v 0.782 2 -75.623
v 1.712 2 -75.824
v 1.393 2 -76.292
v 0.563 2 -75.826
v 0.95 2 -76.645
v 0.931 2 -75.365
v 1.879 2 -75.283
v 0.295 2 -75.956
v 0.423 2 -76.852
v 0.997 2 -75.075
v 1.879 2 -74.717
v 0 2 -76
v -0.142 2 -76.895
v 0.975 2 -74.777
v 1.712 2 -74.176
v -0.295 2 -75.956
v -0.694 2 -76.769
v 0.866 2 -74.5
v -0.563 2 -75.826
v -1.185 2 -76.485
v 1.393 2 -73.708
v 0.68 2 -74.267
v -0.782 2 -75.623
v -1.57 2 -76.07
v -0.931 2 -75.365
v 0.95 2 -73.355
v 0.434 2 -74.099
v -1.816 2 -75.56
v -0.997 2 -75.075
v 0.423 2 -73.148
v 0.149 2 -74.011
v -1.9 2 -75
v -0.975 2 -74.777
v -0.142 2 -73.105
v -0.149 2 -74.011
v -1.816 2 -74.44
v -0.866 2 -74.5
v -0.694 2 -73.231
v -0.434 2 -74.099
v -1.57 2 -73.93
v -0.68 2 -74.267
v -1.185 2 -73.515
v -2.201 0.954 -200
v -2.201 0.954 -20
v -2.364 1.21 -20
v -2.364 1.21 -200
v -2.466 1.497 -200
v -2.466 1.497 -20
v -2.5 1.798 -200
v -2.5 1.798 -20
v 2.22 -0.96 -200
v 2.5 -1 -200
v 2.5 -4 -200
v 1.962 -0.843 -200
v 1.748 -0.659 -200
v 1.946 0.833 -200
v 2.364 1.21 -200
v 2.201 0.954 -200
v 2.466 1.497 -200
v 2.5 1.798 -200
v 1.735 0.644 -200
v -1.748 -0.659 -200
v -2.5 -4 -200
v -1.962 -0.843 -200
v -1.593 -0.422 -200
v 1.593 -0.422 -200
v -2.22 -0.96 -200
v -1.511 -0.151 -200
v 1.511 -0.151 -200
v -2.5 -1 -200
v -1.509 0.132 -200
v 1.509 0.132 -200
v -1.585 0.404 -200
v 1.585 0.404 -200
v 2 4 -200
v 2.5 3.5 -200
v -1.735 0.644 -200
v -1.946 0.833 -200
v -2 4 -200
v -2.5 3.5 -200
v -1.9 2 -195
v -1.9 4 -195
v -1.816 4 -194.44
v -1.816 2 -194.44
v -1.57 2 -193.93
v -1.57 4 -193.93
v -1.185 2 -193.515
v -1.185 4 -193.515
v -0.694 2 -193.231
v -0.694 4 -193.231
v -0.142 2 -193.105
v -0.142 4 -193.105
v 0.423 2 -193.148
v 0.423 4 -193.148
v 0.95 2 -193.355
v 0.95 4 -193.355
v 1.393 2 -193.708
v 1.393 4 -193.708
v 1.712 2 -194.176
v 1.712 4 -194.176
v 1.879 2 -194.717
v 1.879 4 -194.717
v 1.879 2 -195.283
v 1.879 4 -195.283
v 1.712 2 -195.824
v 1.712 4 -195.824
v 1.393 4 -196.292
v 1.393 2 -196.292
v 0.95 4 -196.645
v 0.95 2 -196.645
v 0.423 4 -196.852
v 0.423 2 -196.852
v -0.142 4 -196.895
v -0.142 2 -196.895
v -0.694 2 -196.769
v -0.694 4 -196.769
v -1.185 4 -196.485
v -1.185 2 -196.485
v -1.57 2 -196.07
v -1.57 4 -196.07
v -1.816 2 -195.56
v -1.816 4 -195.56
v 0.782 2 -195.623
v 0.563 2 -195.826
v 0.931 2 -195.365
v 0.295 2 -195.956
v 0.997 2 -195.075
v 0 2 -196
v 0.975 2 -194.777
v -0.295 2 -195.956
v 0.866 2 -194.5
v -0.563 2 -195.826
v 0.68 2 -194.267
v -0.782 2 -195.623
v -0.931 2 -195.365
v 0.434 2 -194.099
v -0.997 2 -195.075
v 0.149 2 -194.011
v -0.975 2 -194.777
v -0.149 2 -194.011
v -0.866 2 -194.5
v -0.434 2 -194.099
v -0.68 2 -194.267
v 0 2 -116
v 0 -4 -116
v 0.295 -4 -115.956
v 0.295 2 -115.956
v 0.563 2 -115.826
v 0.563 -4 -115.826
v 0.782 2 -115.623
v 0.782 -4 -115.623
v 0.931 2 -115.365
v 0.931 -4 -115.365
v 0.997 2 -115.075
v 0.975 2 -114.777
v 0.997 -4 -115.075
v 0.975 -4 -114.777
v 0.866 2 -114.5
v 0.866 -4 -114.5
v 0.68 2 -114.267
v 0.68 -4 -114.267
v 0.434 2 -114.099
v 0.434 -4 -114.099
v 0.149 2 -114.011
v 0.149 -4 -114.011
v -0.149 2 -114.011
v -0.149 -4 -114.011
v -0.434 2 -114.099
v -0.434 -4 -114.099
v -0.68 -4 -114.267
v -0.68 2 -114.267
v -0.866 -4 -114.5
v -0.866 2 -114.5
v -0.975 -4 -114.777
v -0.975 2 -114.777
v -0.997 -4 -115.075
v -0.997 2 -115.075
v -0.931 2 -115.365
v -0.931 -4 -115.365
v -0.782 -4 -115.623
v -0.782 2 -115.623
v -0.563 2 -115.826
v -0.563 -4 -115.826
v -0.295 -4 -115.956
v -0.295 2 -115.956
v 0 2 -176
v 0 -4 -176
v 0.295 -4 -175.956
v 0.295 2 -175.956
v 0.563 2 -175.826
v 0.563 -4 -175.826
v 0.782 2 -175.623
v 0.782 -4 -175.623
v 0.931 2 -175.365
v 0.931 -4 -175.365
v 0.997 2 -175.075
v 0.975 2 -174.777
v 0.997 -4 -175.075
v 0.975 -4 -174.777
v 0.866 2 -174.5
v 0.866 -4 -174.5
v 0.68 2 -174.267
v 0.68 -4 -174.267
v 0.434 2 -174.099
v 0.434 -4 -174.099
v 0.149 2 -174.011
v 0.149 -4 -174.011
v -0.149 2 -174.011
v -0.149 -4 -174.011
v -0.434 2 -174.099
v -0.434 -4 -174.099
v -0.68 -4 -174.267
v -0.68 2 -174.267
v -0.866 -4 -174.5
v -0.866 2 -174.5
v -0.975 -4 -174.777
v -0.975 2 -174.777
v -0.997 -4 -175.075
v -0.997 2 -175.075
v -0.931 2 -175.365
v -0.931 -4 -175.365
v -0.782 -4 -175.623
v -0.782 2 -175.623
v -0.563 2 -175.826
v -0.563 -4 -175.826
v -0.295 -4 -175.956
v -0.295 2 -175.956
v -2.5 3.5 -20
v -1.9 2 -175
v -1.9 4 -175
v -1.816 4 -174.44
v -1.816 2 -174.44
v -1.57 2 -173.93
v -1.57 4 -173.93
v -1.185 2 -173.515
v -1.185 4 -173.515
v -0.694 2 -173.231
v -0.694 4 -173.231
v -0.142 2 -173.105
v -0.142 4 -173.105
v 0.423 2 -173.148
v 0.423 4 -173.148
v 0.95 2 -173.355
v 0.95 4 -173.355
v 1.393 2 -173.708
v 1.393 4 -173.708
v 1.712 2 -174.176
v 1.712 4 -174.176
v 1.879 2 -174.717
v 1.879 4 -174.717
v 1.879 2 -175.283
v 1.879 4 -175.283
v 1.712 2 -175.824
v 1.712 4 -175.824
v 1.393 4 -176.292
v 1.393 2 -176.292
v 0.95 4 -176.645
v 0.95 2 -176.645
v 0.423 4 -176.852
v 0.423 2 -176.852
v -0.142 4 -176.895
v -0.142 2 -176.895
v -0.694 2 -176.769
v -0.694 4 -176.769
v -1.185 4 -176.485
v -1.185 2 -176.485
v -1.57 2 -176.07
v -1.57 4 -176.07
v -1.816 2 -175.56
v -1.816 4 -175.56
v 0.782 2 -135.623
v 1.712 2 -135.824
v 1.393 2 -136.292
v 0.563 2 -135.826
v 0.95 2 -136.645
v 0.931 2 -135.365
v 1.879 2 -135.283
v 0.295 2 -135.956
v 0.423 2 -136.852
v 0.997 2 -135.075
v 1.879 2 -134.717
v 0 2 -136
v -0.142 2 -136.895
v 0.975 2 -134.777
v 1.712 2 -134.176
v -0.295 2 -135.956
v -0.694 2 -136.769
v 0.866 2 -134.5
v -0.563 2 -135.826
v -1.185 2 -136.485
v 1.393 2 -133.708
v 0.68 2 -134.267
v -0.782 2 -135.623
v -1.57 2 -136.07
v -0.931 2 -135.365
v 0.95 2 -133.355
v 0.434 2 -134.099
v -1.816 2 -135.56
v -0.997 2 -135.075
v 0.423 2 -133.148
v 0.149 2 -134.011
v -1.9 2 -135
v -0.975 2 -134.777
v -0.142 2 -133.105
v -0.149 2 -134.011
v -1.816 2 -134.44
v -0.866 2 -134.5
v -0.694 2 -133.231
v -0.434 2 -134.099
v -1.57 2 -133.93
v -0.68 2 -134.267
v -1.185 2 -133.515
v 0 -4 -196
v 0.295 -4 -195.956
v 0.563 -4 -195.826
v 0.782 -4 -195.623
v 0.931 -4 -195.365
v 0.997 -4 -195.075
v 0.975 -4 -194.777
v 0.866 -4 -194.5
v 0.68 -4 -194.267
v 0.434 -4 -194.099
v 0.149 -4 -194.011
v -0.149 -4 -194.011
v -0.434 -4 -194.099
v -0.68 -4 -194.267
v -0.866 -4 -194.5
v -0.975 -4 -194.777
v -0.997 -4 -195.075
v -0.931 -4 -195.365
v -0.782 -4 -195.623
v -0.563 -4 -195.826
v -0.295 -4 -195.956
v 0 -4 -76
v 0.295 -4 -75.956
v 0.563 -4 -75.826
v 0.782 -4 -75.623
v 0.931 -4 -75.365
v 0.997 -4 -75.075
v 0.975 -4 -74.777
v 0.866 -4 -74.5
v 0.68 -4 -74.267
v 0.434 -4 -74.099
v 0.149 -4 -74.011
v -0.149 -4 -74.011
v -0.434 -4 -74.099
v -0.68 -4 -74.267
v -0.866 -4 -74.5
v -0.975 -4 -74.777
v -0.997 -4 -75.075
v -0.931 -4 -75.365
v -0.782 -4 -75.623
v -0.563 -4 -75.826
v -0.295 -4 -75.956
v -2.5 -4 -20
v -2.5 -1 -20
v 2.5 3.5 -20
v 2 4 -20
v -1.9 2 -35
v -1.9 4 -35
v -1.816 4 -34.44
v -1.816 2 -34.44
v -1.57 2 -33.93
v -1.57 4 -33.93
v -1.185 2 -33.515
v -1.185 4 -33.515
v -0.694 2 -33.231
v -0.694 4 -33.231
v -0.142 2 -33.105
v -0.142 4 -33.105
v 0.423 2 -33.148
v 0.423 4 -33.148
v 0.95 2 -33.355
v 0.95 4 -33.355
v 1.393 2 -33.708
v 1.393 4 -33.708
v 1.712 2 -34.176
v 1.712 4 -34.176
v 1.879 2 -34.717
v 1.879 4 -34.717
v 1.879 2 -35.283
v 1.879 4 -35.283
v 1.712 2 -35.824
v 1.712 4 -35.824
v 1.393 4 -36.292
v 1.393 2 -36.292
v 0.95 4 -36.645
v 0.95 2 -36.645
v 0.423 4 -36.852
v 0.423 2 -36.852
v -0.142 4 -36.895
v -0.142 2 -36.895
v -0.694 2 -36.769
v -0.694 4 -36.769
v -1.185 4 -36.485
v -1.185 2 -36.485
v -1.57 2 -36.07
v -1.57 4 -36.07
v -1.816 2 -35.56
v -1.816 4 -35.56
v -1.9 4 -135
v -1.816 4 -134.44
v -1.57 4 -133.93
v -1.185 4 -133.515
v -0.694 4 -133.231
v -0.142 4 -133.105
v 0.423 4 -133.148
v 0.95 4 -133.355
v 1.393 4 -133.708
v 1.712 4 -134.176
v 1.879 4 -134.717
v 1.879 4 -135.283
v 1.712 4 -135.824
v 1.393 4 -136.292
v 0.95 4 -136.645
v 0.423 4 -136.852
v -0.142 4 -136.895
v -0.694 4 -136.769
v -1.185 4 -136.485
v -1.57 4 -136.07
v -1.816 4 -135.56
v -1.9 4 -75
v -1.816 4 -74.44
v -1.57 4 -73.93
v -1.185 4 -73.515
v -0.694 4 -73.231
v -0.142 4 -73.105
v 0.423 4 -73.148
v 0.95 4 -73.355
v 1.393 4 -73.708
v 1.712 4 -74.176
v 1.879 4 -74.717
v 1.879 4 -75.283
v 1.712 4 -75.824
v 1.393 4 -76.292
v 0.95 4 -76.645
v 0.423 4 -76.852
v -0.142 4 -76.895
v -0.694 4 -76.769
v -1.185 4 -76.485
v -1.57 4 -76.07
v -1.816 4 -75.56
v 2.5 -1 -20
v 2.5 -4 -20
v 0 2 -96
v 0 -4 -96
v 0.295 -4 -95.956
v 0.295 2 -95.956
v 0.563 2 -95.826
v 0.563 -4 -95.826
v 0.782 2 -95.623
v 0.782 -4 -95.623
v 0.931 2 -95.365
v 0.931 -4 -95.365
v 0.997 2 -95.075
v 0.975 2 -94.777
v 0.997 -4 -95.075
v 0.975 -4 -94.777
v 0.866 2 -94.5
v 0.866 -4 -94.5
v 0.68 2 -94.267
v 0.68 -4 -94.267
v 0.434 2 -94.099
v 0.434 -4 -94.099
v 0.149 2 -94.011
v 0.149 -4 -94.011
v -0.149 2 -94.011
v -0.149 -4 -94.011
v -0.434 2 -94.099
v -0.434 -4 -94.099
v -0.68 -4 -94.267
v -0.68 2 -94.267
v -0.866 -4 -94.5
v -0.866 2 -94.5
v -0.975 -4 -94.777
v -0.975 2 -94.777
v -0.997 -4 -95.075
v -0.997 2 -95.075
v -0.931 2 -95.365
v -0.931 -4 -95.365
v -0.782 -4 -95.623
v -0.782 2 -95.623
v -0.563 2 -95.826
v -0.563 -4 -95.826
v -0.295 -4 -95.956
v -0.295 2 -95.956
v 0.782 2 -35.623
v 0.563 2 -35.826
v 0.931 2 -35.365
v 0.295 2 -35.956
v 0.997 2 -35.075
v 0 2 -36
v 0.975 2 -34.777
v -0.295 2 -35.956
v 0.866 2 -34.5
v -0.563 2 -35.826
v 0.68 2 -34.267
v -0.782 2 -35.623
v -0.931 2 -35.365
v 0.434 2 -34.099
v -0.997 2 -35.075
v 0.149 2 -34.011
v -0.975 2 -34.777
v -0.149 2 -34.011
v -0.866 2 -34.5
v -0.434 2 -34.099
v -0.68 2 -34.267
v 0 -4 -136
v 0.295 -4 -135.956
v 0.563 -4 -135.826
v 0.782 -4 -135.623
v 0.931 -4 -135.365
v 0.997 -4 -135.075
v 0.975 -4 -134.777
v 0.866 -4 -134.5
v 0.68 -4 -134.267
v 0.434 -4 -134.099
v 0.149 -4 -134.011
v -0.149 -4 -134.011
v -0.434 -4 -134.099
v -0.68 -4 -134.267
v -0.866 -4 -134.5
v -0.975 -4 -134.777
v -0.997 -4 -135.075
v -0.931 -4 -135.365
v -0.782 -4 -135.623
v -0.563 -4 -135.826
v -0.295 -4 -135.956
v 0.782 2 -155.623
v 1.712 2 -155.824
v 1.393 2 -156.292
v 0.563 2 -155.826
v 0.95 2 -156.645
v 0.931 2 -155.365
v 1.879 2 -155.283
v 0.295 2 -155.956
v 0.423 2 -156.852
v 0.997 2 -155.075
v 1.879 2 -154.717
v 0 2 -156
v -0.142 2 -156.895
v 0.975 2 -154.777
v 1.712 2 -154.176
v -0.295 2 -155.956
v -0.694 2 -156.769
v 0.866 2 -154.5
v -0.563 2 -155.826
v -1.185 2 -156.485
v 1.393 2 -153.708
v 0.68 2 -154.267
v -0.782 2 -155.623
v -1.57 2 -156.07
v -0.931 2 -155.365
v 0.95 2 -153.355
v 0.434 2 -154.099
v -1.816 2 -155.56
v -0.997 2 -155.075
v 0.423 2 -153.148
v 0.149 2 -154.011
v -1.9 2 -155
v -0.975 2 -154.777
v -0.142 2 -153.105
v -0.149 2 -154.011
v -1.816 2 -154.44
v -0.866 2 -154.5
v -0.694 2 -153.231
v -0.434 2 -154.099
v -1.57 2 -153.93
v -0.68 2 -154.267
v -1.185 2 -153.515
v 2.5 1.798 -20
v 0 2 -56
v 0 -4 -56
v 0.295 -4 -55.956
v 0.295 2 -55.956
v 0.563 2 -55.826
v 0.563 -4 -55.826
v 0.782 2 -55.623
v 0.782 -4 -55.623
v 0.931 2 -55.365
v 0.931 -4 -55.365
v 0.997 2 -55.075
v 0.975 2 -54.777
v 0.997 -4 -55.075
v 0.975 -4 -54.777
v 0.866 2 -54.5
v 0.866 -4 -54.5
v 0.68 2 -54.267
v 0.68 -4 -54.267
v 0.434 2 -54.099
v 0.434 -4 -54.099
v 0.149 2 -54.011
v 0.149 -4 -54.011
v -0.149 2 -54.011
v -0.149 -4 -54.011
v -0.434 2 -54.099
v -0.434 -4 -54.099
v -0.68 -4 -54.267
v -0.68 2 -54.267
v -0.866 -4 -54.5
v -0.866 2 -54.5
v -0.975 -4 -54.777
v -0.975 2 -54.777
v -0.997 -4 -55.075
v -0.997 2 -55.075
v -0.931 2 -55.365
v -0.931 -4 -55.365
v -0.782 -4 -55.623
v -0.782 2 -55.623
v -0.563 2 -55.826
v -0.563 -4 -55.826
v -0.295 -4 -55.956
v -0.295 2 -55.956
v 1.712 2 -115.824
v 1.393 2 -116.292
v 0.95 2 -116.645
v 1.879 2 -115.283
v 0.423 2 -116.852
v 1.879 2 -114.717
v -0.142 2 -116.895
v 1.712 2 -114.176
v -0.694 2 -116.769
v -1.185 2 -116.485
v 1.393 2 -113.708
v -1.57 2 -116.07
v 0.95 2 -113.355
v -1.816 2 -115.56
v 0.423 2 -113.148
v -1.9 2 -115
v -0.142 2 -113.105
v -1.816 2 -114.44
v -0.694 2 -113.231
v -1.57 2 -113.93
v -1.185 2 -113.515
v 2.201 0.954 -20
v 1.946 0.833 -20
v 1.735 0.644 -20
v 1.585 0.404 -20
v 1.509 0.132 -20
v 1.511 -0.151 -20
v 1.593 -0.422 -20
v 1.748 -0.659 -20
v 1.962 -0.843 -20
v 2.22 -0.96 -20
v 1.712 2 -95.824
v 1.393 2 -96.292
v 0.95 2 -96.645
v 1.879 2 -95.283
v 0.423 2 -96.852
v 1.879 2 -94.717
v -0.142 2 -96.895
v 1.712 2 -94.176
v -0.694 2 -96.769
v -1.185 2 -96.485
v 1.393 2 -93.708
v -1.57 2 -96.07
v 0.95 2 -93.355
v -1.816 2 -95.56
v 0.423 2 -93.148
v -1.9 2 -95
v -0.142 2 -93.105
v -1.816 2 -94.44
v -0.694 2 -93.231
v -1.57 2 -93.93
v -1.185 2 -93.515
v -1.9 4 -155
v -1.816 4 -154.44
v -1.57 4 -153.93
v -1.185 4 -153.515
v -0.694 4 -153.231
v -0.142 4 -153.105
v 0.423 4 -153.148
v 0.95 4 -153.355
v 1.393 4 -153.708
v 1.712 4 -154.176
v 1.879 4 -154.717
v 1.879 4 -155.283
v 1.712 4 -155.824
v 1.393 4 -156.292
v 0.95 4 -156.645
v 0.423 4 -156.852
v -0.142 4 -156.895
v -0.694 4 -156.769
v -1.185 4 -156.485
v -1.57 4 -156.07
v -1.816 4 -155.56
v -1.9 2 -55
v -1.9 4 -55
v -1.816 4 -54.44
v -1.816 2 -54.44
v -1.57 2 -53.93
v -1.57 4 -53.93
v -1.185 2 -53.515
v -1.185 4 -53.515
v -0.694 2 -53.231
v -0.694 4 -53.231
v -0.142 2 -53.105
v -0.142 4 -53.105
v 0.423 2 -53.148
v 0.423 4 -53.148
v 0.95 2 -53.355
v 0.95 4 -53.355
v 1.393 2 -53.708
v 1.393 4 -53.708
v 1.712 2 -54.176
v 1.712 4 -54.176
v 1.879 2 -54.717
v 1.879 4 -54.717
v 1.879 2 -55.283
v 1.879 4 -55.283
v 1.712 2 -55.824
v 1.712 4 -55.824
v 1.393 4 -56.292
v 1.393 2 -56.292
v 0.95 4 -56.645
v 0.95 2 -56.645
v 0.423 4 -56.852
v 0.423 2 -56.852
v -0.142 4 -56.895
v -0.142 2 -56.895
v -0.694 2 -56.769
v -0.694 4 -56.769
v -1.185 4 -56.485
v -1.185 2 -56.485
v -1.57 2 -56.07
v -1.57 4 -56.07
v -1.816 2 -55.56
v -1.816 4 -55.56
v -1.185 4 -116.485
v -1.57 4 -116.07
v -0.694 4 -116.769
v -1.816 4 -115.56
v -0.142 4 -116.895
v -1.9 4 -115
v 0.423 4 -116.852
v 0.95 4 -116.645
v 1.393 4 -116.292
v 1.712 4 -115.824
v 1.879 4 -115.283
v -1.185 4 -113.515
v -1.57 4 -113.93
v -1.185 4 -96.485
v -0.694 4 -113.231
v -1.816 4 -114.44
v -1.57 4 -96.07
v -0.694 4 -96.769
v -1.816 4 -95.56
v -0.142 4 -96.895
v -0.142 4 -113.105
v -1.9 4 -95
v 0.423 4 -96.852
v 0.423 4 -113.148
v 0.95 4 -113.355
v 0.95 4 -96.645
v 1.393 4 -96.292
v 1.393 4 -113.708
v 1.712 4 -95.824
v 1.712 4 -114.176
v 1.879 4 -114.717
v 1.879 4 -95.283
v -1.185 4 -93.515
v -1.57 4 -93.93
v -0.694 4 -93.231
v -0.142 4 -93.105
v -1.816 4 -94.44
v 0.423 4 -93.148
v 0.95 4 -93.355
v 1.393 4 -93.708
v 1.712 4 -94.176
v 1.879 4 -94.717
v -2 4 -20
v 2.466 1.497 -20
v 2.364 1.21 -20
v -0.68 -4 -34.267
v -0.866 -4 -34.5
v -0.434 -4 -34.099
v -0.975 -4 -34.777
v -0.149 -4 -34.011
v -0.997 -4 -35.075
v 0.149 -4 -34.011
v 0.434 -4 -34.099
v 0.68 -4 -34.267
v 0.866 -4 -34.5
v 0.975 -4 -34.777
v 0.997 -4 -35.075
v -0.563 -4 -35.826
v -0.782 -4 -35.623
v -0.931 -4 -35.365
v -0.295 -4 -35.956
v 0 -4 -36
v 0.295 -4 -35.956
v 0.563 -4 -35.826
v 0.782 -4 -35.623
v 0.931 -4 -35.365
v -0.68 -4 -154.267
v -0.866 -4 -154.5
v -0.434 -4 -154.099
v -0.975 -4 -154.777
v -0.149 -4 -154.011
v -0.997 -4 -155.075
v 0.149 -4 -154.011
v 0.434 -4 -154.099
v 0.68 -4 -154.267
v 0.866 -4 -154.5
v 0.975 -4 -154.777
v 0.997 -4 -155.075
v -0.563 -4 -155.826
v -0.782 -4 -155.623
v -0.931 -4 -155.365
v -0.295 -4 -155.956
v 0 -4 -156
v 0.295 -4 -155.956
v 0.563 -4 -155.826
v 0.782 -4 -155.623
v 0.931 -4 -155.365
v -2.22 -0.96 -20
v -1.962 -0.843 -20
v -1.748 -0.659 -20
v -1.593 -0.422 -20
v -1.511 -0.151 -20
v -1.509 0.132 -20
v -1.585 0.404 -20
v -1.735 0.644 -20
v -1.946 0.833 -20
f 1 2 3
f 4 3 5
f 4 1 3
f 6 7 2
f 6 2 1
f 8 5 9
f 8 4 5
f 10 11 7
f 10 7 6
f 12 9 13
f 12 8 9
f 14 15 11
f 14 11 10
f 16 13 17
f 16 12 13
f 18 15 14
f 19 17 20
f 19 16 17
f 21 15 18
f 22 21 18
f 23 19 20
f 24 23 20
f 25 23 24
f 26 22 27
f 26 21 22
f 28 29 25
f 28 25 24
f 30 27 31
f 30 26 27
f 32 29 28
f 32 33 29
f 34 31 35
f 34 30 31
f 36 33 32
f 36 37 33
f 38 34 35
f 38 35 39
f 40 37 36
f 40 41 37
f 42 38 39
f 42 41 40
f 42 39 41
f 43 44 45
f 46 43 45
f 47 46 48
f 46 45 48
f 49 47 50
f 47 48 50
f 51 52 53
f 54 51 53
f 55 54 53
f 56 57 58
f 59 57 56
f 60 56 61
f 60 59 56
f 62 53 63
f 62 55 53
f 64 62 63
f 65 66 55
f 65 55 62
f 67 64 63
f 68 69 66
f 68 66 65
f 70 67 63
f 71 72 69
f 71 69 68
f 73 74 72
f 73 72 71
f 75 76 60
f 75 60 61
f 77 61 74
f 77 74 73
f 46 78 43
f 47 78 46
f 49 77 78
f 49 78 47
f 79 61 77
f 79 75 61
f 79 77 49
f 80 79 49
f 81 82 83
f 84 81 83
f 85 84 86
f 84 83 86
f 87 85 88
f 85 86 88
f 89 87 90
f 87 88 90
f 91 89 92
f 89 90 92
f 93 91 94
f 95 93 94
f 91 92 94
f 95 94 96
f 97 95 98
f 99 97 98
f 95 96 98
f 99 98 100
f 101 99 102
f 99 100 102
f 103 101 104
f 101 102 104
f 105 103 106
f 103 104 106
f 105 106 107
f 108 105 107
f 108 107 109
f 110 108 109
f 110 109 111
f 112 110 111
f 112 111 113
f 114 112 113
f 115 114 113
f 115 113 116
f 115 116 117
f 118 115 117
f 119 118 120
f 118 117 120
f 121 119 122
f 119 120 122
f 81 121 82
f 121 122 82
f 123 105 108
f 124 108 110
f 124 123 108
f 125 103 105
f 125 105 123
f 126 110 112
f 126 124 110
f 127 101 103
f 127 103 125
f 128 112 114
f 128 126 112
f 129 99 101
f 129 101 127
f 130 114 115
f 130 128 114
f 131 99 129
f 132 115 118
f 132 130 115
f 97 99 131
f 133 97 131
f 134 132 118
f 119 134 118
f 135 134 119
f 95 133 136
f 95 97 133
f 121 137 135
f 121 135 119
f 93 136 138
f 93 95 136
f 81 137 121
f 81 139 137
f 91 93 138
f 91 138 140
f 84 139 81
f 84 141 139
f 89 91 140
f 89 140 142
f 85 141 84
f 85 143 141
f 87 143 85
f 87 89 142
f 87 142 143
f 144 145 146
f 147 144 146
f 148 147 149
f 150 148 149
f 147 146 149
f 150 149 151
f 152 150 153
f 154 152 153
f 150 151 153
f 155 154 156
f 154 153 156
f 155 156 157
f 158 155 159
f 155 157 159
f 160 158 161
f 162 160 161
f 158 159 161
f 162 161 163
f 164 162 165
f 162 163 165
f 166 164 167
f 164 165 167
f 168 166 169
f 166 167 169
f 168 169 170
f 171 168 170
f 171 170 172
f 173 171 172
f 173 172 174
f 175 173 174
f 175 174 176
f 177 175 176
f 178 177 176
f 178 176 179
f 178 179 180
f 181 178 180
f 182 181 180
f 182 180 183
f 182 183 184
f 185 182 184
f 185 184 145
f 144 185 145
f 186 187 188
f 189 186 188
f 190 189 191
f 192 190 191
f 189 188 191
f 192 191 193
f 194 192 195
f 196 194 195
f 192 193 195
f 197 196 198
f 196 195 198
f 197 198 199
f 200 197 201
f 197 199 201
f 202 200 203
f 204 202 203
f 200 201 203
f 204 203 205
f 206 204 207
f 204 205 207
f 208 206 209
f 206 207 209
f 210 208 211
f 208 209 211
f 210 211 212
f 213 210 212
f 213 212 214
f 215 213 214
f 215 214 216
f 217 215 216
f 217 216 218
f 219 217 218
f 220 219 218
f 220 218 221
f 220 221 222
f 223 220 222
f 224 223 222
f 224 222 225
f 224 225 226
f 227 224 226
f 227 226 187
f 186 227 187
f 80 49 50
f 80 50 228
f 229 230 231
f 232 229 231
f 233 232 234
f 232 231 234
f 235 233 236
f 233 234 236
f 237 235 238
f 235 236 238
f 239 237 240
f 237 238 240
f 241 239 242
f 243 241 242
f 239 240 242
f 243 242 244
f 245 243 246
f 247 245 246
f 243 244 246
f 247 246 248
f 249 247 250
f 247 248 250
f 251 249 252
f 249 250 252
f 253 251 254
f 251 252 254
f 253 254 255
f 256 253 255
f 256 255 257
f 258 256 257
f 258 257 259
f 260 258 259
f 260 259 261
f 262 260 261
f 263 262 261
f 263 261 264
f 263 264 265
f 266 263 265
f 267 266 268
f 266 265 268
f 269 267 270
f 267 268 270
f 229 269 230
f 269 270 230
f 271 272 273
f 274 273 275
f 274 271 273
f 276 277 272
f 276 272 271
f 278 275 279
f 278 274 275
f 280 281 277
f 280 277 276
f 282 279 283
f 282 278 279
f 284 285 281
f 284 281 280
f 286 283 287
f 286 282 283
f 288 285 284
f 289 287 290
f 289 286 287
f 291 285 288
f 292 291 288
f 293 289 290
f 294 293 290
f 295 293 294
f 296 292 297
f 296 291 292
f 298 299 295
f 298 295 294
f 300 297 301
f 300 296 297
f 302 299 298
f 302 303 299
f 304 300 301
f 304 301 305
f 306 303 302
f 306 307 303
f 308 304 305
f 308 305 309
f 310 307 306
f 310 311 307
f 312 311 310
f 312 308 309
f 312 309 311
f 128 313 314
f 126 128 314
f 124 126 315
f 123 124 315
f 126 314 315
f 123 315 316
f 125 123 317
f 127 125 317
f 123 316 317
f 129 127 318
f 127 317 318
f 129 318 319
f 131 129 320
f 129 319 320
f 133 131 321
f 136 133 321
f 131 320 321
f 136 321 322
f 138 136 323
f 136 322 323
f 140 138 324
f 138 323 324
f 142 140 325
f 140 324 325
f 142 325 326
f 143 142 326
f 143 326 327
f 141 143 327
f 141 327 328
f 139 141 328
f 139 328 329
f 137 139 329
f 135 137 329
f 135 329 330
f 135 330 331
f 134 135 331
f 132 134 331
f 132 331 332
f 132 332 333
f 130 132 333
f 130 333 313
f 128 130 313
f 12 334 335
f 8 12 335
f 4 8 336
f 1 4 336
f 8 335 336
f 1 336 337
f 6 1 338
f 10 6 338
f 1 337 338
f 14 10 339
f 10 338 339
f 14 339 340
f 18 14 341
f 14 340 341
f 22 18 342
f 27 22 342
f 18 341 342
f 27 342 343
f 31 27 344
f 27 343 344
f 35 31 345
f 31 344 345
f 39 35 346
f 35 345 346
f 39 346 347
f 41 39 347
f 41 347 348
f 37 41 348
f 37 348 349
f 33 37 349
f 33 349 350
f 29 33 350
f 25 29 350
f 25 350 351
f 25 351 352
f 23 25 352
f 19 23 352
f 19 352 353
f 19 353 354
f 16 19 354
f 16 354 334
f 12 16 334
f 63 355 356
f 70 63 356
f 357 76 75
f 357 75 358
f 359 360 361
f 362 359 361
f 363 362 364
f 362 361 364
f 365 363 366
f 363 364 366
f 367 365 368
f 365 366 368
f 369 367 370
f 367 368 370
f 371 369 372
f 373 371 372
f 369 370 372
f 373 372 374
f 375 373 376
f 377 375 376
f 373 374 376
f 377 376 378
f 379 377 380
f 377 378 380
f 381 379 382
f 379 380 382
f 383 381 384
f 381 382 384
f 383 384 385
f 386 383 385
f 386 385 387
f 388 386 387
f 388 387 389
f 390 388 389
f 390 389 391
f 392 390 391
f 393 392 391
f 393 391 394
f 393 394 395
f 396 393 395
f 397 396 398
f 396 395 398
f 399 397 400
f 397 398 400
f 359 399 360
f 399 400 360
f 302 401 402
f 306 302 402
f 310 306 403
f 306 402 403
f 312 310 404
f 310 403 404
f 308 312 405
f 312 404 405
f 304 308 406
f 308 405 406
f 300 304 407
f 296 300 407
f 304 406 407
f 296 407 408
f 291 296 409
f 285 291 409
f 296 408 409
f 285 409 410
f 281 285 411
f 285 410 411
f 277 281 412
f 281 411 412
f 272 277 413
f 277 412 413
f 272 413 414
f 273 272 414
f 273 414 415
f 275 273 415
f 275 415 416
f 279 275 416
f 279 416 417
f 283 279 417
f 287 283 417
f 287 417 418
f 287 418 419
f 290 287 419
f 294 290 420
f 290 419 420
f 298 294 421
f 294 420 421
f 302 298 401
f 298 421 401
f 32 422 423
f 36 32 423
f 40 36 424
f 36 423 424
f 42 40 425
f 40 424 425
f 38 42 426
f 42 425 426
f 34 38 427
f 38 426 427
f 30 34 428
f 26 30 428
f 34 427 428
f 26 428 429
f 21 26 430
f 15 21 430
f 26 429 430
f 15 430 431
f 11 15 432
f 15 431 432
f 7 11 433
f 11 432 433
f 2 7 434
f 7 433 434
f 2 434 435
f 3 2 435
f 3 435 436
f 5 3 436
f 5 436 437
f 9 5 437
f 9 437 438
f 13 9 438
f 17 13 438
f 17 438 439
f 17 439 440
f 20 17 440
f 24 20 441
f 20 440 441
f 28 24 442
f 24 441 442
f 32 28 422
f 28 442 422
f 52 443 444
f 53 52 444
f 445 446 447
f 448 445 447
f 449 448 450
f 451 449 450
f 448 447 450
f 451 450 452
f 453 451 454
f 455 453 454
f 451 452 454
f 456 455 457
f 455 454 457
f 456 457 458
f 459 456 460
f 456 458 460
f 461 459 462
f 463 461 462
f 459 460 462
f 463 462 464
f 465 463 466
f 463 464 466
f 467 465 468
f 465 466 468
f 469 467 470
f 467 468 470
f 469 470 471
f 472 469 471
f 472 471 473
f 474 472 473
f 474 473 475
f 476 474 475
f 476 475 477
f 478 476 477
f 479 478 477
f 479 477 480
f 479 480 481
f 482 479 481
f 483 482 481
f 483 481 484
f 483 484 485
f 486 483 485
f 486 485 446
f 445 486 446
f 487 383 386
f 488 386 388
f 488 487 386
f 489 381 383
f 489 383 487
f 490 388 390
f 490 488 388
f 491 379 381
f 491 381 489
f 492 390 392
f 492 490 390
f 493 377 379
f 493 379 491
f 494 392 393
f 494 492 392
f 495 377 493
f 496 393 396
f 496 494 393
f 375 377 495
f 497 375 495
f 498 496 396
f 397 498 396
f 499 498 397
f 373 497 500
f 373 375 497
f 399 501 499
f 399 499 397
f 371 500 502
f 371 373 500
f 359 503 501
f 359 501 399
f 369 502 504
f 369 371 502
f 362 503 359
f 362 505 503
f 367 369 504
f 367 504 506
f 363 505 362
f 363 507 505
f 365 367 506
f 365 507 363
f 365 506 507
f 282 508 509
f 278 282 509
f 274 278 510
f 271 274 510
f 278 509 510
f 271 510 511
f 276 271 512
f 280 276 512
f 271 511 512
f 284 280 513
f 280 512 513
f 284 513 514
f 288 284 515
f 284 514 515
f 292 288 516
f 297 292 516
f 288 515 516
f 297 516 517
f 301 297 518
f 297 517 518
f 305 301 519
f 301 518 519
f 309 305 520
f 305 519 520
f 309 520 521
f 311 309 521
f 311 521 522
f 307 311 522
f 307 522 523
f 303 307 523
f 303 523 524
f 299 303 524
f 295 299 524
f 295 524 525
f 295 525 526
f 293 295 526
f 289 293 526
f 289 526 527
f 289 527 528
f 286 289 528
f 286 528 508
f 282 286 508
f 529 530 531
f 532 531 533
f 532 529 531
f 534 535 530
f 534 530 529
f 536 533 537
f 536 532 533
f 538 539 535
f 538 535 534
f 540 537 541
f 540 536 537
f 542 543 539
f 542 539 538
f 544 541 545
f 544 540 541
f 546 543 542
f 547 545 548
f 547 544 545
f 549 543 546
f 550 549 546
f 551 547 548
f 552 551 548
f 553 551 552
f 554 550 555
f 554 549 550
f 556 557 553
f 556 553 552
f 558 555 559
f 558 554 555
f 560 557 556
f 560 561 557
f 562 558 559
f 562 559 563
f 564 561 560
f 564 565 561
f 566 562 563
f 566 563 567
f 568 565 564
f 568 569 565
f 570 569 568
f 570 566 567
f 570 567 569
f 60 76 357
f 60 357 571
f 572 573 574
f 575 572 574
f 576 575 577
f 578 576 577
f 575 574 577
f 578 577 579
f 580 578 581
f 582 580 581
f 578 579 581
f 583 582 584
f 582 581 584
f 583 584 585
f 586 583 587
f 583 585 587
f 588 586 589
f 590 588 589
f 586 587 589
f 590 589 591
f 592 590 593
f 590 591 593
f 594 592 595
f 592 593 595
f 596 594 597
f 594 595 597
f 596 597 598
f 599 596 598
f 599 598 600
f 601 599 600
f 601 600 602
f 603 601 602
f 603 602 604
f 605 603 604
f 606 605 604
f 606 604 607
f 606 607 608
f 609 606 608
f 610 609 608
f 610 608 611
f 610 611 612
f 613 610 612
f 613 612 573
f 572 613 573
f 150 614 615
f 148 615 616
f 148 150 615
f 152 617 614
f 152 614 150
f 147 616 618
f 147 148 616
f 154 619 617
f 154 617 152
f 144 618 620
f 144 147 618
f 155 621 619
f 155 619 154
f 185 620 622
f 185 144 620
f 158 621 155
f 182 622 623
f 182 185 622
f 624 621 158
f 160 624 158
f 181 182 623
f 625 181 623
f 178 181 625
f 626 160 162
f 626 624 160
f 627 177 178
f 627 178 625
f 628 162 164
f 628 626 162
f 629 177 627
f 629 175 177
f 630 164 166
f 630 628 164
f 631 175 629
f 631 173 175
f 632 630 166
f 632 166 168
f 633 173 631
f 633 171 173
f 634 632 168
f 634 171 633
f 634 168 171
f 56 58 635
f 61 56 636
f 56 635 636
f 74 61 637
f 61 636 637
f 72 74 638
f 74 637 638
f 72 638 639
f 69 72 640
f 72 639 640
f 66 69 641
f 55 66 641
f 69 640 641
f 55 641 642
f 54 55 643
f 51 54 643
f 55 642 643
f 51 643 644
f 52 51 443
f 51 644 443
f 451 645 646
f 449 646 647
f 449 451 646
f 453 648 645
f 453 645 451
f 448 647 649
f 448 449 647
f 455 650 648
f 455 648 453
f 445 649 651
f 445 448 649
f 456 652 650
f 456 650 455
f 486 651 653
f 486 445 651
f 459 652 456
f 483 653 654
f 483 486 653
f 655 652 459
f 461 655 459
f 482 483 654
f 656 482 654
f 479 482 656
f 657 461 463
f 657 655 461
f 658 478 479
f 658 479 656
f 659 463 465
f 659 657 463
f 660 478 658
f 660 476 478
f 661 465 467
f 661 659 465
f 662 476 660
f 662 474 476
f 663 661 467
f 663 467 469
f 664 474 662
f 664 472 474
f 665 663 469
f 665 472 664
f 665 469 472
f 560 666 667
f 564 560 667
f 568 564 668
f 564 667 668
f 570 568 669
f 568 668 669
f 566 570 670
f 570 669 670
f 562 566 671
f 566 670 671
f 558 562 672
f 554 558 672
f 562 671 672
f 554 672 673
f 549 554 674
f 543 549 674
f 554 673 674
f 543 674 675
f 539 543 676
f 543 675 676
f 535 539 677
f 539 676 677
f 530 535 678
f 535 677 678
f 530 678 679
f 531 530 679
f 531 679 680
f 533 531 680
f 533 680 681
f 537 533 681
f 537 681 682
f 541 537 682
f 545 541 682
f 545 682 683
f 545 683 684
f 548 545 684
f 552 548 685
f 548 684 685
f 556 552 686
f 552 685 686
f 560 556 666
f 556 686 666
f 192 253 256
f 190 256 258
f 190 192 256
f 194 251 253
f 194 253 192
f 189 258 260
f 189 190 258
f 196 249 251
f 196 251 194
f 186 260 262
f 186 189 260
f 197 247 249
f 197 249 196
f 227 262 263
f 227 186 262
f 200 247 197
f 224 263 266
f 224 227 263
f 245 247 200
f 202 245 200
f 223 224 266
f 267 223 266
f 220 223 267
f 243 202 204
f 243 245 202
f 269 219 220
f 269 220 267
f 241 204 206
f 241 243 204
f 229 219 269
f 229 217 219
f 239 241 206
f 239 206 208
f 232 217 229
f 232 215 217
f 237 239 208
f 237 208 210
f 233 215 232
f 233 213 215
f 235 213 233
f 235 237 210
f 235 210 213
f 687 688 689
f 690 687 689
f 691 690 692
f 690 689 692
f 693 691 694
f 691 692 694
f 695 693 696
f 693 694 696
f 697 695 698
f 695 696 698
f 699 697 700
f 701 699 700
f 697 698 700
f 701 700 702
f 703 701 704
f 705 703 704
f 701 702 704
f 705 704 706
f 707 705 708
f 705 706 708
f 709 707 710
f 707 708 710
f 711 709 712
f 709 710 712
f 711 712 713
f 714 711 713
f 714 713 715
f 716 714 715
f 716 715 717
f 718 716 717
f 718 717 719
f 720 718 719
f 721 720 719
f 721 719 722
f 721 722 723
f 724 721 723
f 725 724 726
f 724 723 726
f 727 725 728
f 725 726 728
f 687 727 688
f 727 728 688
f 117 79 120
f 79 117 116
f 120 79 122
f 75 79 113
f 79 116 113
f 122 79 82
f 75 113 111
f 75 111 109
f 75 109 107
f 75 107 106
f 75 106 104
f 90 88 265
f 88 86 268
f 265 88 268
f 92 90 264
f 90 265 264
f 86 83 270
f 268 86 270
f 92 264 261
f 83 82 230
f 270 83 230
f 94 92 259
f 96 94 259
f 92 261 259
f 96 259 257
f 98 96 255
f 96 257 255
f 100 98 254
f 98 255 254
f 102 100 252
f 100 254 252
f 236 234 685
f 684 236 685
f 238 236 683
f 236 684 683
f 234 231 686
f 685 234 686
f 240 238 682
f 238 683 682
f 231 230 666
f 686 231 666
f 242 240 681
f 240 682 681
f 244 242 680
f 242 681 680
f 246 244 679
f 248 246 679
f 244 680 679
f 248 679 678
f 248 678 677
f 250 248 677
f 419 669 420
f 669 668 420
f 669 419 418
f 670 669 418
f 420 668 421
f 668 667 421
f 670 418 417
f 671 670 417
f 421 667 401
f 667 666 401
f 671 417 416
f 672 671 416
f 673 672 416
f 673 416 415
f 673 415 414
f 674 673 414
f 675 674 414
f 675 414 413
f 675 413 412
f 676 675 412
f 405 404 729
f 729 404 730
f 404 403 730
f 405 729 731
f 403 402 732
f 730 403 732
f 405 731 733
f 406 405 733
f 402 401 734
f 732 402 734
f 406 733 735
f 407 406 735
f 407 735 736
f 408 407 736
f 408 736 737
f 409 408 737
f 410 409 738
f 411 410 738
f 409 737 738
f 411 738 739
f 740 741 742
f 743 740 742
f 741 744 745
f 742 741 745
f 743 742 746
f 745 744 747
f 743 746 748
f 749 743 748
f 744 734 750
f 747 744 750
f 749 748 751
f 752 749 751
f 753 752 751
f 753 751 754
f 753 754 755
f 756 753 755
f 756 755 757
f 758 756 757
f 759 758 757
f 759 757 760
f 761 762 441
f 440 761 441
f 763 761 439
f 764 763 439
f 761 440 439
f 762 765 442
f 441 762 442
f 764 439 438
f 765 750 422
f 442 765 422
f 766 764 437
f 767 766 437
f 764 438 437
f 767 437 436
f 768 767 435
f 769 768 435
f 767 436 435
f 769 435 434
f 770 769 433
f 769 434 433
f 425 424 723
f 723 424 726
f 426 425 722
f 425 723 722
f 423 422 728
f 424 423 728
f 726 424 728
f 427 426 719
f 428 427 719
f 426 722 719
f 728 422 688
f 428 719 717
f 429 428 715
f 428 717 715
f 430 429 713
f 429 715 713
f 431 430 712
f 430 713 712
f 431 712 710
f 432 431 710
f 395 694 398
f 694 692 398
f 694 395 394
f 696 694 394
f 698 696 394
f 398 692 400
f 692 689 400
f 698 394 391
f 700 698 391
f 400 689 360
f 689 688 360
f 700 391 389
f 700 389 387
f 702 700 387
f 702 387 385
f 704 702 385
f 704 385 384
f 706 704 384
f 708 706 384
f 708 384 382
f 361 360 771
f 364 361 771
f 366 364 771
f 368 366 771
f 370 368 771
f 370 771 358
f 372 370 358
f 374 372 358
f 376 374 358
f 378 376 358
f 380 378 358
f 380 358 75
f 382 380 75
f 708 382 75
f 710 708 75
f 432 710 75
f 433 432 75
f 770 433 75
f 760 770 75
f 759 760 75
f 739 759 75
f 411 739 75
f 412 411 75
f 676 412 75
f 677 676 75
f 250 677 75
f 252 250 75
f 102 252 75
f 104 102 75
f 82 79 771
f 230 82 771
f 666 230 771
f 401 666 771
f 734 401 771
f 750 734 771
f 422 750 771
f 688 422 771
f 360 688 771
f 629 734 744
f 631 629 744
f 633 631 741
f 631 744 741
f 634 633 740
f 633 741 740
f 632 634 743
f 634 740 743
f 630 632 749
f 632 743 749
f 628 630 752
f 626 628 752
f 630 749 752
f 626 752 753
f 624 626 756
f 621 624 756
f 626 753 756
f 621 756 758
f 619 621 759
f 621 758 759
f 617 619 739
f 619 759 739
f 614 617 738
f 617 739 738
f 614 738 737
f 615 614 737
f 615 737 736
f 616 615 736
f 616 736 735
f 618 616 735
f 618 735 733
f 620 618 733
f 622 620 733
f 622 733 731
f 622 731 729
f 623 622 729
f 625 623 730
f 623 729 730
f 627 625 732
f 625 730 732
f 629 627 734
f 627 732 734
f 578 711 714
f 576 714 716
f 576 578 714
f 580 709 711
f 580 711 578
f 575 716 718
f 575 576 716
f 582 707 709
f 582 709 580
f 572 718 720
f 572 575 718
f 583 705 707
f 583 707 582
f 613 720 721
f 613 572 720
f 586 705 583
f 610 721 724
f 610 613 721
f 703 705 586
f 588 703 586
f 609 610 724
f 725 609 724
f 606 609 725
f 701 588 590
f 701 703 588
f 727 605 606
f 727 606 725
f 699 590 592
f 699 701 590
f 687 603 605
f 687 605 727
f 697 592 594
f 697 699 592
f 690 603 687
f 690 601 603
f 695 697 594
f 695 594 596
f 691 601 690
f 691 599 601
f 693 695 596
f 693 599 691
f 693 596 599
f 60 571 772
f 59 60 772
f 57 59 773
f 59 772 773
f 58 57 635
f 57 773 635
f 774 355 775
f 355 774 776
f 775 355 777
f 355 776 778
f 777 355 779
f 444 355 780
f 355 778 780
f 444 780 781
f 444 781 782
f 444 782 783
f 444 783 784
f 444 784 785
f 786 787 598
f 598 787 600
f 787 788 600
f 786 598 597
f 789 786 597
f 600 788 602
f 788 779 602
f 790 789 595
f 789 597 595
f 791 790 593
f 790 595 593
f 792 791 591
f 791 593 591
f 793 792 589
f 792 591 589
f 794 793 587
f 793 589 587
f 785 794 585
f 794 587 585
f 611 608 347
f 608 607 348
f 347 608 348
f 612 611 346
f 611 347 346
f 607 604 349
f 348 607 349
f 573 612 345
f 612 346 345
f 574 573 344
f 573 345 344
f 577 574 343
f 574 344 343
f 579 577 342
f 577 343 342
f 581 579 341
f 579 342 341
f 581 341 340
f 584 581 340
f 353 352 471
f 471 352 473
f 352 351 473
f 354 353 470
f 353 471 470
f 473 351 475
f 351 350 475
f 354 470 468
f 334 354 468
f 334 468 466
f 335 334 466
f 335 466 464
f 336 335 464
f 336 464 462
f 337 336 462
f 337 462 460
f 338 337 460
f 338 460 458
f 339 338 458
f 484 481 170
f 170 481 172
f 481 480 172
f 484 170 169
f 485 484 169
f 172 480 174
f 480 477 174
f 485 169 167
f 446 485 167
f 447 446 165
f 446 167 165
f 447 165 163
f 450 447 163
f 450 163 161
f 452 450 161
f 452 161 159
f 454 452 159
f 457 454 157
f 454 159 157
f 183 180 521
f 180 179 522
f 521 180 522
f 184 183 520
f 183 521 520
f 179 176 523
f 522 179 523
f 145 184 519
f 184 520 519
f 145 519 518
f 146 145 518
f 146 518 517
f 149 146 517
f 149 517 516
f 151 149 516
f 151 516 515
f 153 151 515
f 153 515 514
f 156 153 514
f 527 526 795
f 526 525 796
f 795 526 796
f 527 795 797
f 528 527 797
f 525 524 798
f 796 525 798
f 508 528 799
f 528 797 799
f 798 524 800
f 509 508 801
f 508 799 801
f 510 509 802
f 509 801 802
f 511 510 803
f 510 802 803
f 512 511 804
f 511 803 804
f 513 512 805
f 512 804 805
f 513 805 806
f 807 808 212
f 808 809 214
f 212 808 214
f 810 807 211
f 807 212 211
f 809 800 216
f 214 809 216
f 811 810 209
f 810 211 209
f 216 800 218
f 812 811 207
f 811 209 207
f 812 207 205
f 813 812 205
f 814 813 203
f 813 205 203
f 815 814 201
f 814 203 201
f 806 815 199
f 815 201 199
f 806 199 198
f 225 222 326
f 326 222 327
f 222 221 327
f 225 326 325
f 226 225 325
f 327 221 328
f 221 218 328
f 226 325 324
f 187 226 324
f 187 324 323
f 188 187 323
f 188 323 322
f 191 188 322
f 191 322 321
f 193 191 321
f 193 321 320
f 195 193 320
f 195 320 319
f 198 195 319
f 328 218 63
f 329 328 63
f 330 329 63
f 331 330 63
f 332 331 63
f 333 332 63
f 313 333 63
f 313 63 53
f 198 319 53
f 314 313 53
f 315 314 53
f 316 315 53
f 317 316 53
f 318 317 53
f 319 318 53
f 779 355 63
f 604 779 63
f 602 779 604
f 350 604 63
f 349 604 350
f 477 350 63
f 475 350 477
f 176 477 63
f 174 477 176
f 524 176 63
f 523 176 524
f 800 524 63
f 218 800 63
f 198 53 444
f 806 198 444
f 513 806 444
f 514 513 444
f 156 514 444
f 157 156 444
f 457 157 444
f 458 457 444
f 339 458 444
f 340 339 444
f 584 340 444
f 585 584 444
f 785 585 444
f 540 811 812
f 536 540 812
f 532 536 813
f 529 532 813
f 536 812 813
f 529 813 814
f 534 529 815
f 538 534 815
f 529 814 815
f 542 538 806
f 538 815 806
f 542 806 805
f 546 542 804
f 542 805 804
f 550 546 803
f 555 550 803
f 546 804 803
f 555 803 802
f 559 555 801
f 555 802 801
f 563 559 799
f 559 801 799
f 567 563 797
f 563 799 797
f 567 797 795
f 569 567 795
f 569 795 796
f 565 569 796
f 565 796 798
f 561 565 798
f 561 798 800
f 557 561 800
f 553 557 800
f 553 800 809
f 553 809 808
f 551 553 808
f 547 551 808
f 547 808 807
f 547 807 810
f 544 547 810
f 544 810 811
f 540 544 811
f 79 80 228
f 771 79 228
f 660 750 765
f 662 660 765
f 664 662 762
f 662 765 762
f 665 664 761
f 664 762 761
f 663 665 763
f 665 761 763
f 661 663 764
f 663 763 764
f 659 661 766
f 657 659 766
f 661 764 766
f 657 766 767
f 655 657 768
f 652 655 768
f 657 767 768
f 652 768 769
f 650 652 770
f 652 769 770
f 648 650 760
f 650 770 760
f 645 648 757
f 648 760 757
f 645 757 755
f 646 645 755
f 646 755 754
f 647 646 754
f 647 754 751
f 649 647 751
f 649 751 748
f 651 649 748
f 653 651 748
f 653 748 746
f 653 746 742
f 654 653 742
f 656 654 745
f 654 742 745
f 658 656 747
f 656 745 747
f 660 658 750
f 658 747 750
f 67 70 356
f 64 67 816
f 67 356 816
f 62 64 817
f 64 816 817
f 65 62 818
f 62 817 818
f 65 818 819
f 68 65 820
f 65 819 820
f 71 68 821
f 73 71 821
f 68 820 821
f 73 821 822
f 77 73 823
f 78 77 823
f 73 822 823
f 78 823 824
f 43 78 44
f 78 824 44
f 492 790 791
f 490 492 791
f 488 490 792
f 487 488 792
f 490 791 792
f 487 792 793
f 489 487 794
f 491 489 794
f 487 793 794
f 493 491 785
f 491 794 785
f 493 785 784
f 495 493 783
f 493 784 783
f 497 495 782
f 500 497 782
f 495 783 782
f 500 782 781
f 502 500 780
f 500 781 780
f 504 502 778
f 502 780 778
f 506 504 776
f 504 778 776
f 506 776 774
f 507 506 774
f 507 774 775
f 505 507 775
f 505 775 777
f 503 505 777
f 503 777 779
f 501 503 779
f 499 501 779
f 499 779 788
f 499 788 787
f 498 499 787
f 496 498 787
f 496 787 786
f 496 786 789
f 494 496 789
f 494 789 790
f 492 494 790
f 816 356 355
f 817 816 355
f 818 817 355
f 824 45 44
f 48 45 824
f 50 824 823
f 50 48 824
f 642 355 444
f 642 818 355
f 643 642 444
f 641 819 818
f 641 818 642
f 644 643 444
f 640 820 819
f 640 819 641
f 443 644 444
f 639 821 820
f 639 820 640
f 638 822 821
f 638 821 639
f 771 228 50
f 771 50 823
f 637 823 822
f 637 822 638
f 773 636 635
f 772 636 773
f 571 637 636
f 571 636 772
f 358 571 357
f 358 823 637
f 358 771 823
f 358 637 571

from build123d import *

# Parameters (mm, degrees)
SKETCH1_W           = 5
SKETCH1_H           = 8
BOSS_EXTRUDE1_DEPTH = 185
BOSS_EXTRUDE2_DEPTH = 200
SKETCH3_W           = 5
SKETCH3_H           = 8
CUT_EXTRUDE1_DEPTH  = 200
CUT_EXTRUDE2_REACH  = 202.176
SKETCH4_R           = 1
SKETCH5_R           = 1.9
CUT_EXTRUDE3_DEPTH  = 2
CHAMFER1_SIZE       = 0.5
CHAMFER2_SIZE       = 0.5
CUT_EXTRUDE4_DEPTH  = 5


with BuildPart() as part:
    # Sketch1 → Boss-Extrude1 (new body)
    with BuildSketch(Plane.XY):
        Rectangle(SKETCH1_W, SKETCH1_H)
    extrude(amount=BOSS_EXTRUDE1_DEPTH)

    # Sketch2 → Boss-Extrude2 (add)
    with BuildSketch(Plane(origin=(0, 0, 0), x_dir=(-1, 0, 0), z_dir=(0, 0, -1))):
        with BuildLine():
            Line((-2.5, 4), (-2.5, 1.798202453))
            ThreePointArc((-2.5, 1.798202453), (-2.423157727, 1.350663613), (-2.2014329, 0.954388646))
            ThreePointArc((-2.2014329, 0.954388646), (-1.511468603, -0.151015487), (-2.5, -1))
            Line((-2.5, -1), (-2.5, -4))
            Line((-2.5, -4), (2.5, -4))
            Line((2.5, -4), (2.5, -1))
            ThreePointArc((2.5, -1), (1.511468603, -0.151015487), (2.2014329, 0.954388646))
            ThreePointArc((2.2014329, 0.954388646), (2.423157727, 1.350663613), (2.5, 1.798202453))
            Line((2.5, 1.798202453), (2.5, 4))
            Line((2.5, 4), (-2.5, 4))
        make_face()
    extrude(amount=BOSS_EXTRUDE2_DEPTH)

    # Sketch3 → Cut-Extrude1 (cut)
    with BuildSketch(Plane.XY.offset(185)):
        Rectangle(SKETCH3_W, SKETCH3_H)
    extrude(amount=-CUT_EXTRUDE1_DEPTH, mode=Mode.SUBTRACT)

    # Sketch4 → Cut-Extrude2 (cut, up to next)
    with BuildSketch(Plane.XZ.offset(4), mode=Mode.PRIVATE) as cut_extrude2_sk1:
        with Locations(Location((0, -35, 0), (0, 0, 270))):
            Circle(SKETCH4_R)
    cut_extrude2_tool1 = extrude(cut_extrude2_sk1.sketch, amount=-CUT_EXTRUDE2_REACH, mode=Mode.PRIVATE) & part.part
    # Sketch4 → Cut-Extrude2 (cut, up to next)
    with BuildSketch(Plane.XZ.offset(4), mode=Mode.PRIVATE) as cut_extrude2_sk2:
        with Locations(Location((0, -55, 0), (0, 0, 270))):
            Circle(SKETCH4_R)
    cut_extrude2_tool2 = extrude(cut_extrude2_sk2.sketch, amount=-CUT_EXTRUDE2_REACH, mode=Mode.PRIVATE) & part.part
    # Sketch4 → Cut-Extrude2 (cut, up to next)
    with BuildSketch(Plane.XZ.offset(4), mode=Mode.PRIVATE) as cut_extrude2_sk3:
        with Locations(Location((0, -75, 0), (0, 0, 270))):
            Circle(SKETCH4_R)
    cut_extrude2_tool3 = extrude(cut_extrude2_sk3.sketch, amount=-CUT_EXTRUDE2_REACH, mode=Mode.PRIVATE) & part.part
    # Sketch4 → Cut-Extrude2 (cut, up to next)
    with BuildSketch(Plane.XZ.offset(4), mode=Mode.PRIVATE) as cut_extrude2_sk4:
        with Locations(Location((0, -95, 0), (0, 0, 270))):
            Circle(SKETCH4_R)
    cut_extrude2_tool4 = extrude(cut_extrude2_sk4.sketch, amount=-CUT_EXTRUDE2_REACH, mode=Mode.PRIVATE) & part.part
    # Sketch4 → Cut-Extrude2 (cut, up to next)
    with BuildSketch(Plane.XZ.offset(4), mode=Mode.PRIVATE) as cut_extrude2_sk5:
        with Locations(Location((0, -115, 0), (0, 0, 270))):
            Circle(SKETCH4_R)
    cut_extrude2_tool5 = extrude(cut_extrude2_sk5.sketch, amount=-CUT_EXTRUDE2_REACH, mode=Mode.PRIVATE) & part.part
    # Sketch4 → Cut-Extrude2 (cut, up to next)
    with BuildSketch(Plane.XZ.offset(4), mode=Mode.PRIVATE) as cut_extrude2_sk6:
        with Locations(Location((0, -135, 0), (0, 0, 270))):
            Circle(SKETCH4_R)
    cut_extrude2_tool6 = extrude(cut_extrude2_sk6.sketch, amount=-CUT_EXTRUDE2_REACH, mode=Mode.PRIVATE) & part.part
    # Sketch4 → Cut-Extrude2 (cut, up to next)
    with BuildSketch(Plane.XZ.offset(4), mode=Mode.PRIVATE) as cut_extrude2_sk7:
        with Locations(Location((0, -155, 0), (0, 0, 270))):
            Circle(SKETCH4_R)
    cut_extrude2_tool7 = extrude(cut_extrude2_sk7.sketch, amount=-CUT_EXTRUDE2_REACH, mode=Mode.PRIVATE) & part.part
    # Sketch4 → Cut-Extrude2 (cut, up to next)
    with BuildSketch(Plane.XZ.offset(4), mode=Mode.PRIVATE) as cut_extrude2_sk8:
        with Locations(Location((0, -175, 0), (0, 0, 270))):
            Circle(SKETCH4_R)
    cut_extrude2_tool8 = extrude(cut_extrude2_sk8.sketch, amount=-CUT_EXTRUDE2_REACH, mode=Mode.PRIVATE) & part.part
    # Sketch4 → Cut-Extrude2 (cut, up to next)
    with BuildSketch(Plane.XZ.offset(4), mode=Mode.PRIVATE) as cut_extrude2_sk9:
        with Locations(Location((0, -195, 0), (0, 0, 270))):
            Circle(SKETCH4_R)
    cut_extrude2_tool9 = extrude(cut_extrude2_sk9.sketch, amount=-CUT_EXTRUDE2_REACH, mode=Mode.PRIVATE) & part.part
    add(cut_extrude2_tool1.solids().sort_by_distance((0, -4, -35))[0], mode=Mode.SUBTRACT)
    add(cut_extrude2_tool2.solids().sort_by_distance((0, -4, -55))[0], mode=Mode.SUBTRACT)
    add(cut_extrude2_tool3.solids().sort_by_distance((0, -4, -75))[0], mode=Mode.SUBTRACT)
    add(cut_extrude2_tool4.solids().sort_by_distance((0, -4, -95))[0], mode=Mode.SUBTRACT)
    add(cut_extrude2_tool5.solids().sort_by_distance((0, -4, -115))[0], mode=Mode.SUBTRACT)
    add(cut_extrude2_tool6.solids().sort_by_distance((0, -4, -135))[0], mode=Mode.SUBTRACT)
    add(cut_extrude2_tool7.solids().sort_by_distance((0, -4, -155))[0], mode=Mode.SUBTRACT)
    add(cut_extrude2_tool8.solids().sort_by_distance((0, -4, -175))[0], mode=Mode.SUBTRACT)
    add(cut_extrude2_tool9.solids().sort_by_distance((0, -4, -195))[0], mode=Mode.SUBTRACT)

    # Sketch5 → Cut-Extrude3 (cut)
    with BuildSketch(Plane(origin=(0, 4, 0), x_dir=(1, 0, 0), z_dir=(0, 1, 0))):
        with Locations(Location((0, 195, 0), (0, 0, 180))):
            Circle(SKETCH5_R)
        with Locations(Location((0, 175, 0), (0, 0, 180))):
            Circle(SKETCH5_R)
        with Locations(Location((0, 155, 0), (0, 0, 180))):
            Circle(SKETCH5_R)
        with Locations(Location((0, 135, 0), (0, 0, 180))):
            Circle(SKETCH5_R)
        with Locations(Location((0, 115, 0), (0, 0, 180))):
            Circle(SKETCH5_R)
        with Locations(Location((0, 95, 0), (0, 0, 180))):
            Circle(SKETCH5_R)
        with Locations(Location((0, 75, 0), (0, 0, 180))):
            Circle(SKETCH5_R)
        with Locations(Location((0, 55, 0), (0, 0, 180))):
            Circle(SKETCH5_R)
        with Locations(Location((0, 35, 0), (0, 0, 180))):
            Circle(SKETCH5_R)
    extrude(amount=-CUT_EXTRUDE3_DEPTH, mode=Mode.SUBTRACT)

    # Chamfer1
    chamfer1_edges = [part.edges().sort_by_distance(p)[0] for p in [
        (-2.5, 4, -107.5),
    ]]
    chamfer(chamfer1_edges, length=CHAMFER1_SIZE)

    # Chamfer2
    chamfer2_edges = [part.edges().sort_by_distance(p)[0] for p in [
        (2.5, 4, -107.5),
    ]]
    chamfer(chamfer2_edges, length=CHAMFER2_SIZE)

    # Sketch6 → Cut-Extrude4 (cut)
    with BuildSketch(Plane.XY.offset(-15)):
        with BuildLine():
            Line((2.5, 1.798202453), (2.5, 3.5))
            Line((2.5, 3.5), (2, 4))
            Line((2, 4), (-2, 4))
            Line((-2, 4), (-2.5, 3.5))
            Line((-2.5, 3.5), (-2.5, 1.798202453))
            ThreePointArc((-2.5, 1.798202453), (-2.423157727, 1.350663613), (-2.2014329, 0.954388646))
            ThreePointArc((-2.2014329, 0.954388646), (-1.511468603, -0.151015487), (-2.5, -1))
            Line((-2.5, -1), (-2.5, -4))
            Line((-2.5, -4), (2.5, -4))
            Line((2.5, -4), (2.5, -1))
            ThreePointArc((2.5, -1), (1.511468603, -0.151015487), (2.2014329, 0.954388646))
            ThreePointArc((2.2014329, 0.954388646), (2.423157727, 1.350663613), (2.5, 1.798202453))
        make_face()
    extrude(amount=-CUT_EXTRUDE4_DEPTH, mode=Mode.SUBTRACT)


solid = part.part
